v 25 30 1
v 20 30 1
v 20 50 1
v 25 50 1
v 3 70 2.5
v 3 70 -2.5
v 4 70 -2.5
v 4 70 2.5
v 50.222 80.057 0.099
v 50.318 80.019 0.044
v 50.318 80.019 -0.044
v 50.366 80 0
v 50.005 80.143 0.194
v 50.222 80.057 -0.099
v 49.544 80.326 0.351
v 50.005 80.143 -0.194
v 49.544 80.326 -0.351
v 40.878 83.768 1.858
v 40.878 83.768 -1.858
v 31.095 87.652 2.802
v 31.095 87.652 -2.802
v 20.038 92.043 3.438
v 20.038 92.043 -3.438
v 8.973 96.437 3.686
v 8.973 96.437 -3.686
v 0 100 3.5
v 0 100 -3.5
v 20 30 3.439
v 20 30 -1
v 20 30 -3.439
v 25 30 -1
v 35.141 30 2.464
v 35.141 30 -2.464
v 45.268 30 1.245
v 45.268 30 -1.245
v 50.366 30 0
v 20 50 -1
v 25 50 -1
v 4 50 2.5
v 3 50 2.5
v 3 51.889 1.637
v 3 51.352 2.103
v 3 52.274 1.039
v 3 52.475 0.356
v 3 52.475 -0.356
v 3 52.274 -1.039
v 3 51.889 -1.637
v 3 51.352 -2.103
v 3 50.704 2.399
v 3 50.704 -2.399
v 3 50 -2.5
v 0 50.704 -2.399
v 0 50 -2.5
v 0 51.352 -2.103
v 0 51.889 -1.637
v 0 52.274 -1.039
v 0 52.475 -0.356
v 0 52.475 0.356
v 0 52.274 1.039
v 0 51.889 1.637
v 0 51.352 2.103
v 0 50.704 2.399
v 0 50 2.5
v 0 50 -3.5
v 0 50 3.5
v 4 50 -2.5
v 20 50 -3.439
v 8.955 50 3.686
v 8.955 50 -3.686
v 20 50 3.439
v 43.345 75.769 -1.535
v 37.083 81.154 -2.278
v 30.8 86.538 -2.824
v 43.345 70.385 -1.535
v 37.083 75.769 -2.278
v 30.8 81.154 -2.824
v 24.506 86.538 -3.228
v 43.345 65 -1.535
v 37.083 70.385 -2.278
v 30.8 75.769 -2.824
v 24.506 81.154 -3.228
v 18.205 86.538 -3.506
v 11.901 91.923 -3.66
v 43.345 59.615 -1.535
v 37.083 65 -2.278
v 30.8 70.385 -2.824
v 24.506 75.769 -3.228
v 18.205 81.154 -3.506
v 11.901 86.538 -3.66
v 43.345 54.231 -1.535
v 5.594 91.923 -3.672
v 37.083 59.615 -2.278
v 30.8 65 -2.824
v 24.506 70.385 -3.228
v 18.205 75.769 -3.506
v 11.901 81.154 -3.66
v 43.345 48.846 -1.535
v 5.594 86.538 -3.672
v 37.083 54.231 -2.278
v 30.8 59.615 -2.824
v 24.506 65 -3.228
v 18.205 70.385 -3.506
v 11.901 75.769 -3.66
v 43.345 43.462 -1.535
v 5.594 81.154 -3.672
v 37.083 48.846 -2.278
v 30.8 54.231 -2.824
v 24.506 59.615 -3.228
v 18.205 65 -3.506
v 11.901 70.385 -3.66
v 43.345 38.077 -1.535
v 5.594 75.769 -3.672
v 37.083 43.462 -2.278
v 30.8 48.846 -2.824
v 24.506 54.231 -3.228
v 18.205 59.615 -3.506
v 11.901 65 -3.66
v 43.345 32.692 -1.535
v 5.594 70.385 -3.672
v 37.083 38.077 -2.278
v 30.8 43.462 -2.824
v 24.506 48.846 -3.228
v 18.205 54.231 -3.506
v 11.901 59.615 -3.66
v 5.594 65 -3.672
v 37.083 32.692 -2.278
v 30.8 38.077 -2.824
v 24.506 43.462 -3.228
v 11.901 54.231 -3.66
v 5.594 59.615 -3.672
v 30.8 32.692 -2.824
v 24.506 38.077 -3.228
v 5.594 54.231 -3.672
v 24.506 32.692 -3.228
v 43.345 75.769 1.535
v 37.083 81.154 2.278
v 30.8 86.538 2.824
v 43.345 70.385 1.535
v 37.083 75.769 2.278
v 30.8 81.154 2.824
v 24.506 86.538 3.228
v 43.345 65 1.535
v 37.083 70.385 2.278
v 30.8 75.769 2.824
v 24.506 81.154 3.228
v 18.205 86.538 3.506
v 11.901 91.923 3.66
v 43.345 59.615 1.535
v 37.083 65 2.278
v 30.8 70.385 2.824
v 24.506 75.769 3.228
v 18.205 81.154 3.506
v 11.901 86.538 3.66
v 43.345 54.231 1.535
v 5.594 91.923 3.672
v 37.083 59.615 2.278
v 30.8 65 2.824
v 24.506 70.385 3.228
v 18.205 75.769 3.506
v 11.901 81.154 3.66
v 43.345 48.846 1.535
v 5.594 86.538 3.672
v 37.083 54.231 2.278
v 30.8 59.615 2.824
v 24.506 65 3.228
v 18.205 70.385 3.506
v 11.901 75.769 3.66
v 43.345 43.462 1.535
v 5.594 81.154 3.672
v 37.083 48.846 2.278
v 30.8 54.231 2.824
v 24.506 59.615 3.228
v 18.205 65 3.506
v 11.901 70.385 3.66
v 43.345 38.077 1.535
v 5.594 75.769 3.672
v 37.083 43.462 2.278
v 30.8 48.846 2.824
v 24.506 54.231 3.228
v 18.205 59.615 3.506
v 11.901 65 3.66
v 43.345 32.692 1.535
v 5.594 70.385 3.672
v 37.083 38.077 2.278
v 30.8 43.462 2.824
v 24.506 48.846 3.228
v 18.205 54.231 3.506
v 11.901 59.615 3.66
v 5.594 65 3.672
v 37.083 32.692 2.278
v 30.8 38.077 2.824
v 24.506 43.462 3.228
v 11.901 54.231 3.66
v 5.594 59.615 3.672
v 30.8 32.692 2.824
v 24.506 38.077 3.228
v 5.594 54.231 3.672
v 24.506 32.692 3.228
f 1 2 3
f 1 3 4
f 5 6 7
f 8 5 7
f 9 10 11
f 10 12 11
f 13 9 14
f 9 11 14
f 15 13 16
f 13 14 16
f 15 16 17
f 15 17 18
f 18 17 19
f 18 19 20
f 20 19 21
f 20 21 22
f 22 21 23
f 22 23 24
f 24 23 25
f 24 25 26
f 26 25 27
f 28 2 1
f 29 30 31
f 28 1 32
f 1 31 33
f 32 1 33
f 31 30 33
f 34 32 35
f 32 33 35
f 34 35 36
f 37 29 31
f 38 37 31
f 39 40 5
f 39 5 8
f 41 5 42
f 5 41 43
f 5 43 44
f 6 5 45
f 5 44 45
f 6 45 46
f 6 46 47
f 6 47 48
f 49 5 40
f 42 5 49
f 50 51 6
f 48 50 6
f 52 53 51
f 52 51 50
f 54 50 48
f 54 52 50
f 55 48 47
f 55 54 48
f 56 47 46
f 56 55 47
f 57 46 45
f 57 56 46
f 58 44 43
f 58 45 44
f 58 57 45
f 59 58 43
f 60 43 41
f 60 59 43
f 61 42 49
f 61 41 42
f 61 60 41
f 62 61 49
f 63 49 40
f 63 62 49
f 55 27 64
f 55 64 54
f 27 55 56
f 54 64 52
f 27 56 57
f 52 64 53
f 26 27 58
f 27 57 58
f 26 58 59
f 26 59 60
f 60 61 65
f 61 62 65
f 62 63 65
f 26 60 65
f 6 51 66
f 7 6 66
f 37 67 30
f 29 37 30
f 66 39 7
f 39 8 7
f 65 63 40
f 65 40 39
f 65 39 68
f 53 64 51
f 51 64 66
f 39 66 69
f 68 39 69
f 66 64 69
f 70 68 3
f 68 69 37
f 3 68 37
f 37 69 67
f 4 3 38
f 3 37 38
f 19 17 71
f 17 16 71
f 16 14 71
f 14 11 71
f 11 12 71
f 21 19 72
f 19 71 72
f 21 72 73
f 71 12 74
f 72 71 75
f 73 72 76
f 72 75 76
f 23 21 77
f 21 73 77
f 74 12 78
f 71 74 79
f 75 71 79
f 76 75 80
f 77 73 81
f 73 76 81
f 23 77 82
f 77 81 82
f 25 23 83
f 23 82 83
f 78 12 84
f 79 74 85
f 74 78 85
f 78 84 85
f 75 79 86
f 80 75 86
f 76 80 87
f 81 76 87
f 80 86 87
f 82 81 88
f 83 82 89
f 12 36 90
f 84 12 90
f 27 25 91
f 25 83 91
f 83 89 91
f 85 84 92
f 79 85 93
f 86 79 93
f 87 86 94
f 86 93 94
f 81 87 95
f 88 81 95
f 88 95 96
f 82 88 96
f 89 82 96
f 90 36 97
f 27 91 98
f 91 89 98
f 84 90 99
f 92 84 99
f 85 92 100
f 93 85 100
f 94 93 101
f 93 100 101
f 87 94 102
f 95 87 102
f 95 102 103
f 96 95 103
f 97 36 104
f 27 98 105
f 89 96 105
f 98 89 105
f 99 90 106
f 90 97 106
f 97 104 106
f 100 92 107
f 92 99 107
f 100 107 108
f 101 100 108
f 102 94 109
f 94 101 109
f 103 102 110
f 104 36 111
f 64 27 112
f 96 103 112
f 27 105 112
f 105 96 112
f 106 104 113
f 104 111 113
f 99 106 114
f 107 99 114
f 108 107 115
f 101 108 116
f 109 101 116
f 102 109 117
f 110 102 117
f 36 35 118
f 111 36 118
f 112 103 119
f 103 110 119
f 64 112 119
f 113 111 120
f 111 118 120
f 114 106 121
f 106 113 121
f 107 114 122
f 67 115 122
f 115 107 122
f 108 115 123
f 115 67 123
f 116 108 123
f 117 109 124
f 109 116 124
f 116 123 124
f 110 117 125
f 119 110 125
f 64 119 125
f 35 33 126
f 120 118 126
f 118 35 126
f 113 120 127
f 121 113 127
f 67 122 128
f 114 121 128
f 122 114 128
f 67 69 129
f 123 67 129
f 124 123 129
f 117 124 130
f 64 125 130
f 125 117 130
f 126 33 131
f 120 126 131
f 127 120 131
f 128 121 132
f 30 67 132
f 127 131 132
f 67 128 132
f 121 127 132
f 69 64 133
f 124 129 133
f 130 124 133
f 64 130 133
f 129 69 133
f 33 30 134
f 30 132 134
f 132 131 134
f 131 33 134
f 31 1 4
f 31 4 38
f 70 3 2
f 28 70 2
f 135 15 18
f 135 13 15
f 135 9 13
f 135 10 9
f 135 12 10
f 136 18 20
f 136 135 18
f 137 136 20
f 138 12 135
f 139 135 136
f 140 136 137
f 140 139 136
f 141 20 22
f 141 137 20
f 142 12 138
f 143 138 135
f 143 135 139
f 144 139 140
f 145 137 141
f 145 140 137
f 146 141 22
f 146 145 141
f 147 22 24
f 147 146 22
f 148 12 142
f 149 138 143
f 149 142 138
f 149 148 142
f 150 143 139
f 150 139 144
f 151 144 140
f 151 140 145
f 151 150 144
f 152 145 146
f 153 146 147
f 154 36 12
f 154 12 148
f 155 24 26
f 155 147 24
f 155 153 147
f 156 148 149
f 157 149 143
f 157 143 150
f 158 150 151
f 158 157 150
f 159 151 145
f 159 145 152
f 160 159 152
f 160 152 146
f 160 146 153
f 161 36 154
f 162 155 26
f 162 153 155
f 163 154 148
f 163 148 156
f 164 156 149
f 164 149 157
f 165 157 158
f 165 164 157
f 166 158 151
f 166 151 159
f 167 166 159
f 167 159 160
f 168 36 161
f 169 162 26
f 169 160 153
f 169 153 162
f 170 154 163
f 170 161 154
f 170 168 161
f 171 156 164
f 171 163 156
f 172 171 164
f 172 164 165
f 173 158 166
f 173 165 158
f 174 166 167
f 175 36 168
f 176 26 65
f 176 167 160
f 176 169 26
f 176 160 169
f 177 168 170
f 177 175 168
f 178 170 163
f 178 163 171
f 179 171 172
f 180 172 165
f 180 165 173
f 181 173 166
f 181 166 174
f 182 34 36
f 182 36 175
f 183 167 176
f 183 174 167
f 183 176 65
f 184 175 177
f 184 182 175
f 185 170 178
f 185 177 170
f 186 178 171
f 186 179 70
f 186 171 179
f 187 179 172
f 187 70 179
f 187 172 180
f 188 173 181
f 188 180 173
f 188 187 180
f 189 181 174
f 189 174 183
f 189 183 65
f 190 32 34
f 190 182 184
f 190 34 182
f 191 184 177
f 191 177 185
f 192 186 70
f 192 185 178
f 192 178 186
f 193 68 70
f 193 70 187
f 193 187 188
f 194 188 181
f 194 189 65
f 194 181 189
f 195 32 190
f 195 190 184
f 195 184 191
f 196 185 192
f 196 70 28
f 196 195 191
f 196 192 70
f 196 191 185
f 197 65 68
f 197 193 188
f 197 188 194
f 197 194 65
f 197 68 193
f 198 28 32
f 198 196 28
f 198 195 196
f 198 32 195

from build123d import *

# Parameters (mm, degrees)
EXTRUDE_2_DEPTH          = 100
CUT_EXTRUDE_1_DEPTH      = 100
CUT_EXTRUDE_1_DEPTH_BACK = 100
CUT_EXTRUDE_2_DEPTH      = 100
CUT_EXTRUDE_2_DEPTH_BACK = 100
SKETCH_7_R               = 2.5
CUT_EXTRUDE_3_DEPTH      = 4
SKETCH_9_W               = 5
SKETCH_9_H               = 2
CUT_EXTRUDE_5_DEPTH      = 50
SKETCH_11_W              = 1
SKETCH_11_H              = 5
CUT_EXTRUDE_6_DEPTH      = 70


with BuildPart() as part:
    # 草图1 → 凸台-拉伸2 (new body)
    with BuildSketch(Plane(origin=(0, 0, 0), x_dir=(1, 0, 0), z_dir=(0, 1, 0))):
        with BuildLine():
            Line((0, 3.5), (0, -3.5))
            add(Edge.make_bspline(
                [(50.366159274, 0), (50.361611856, -0.007626809), (50.351204479, -0.02006437), (50.331882619, -0.034590016), (50.303550644, -0.054206105), (50.267550201, -0.075556608), (50.212502865, -0.10497516), (50.119653298, -0.148566943), (49.957819519, -0.214752734), (49.665215675, -0.317523283), (49.13925125, -0.473472151), (48.270224034, -0.688745908), (46.70823084, -1.011640024), (44.506574683, -1.380432353), (41.778946661, -1.759931683), (38.652126132, -2.124759538), (35.514265565, -2.438710467), (32.372435692, -2.710036408), (29.227679081, -2.944564854), (26.08060135, -3.145565261), (22.931686571, -3.315201685), (19.781279338, -3.454355095), (16.629676417, -3.563265326), (13.477153227, -3.64092263), (10.32396772, -3.685707952), (7.170479651, -3.693560136), (4.194558842, -3.660897819), (2.007697821, -3.59990808), (0.60968903, -3.538531774), (0, -3.5)],
                knots=[0, 0, 0, 0, 0, 0.00069899, 0.001287975, 0.00188024, 0.002733393, 0.003996075, 0.006218737, 0.009974212, 0.016536224, 0.028474968, 0.049524397, 0.080651233, 0.142462147, 0.204715828, 0.26696952, 0.329223211, 0.391476901, 0.453730594, 0.515984286, 0.578237977, 0.640491669, 0.70274536, 0.764999052, 0.827252742, 0.889506435, 0.951760127, 1, 1, 1, 1, 1], degree=4))
            add(Edge.make_bspline(
                [(50.366159274, 0), (50.361611856, 0.007626809), (50.351204479, 0.02006437), (50.331882619, 0.034590016), (50.303550644, 0.054206105), (50.267550201, 0.075556608), (50.212502865, 0.10497516), (50.119653298, 0.148566943), (49.957819519, 0.214752734), (49.665215675, 0.317523283), (49.13925125, 0.473472151), (48.270224034, 0.688745908), (46.70823084, 1.011640024), (44.506574683, 1.380432353), (41.778946661, 1.759931683), (38.652126132, 2.124759538), (35.514265565, 2.438710467), (32.372435692, 2.710036408), (29.227679081, 2.944564854), (26.08060135, 3.145565261), (22.931686571, 3.315201685), (19.781279338, 3.454355095), (16.629676417, 3.563265326), (13.477153227, 3.64092263), (10.32396772, 3.685707952), (7.170479651, 3.693560136), (4.194558842, 3.660897819), (2.007697821, 3.59990808), (0.60968903, 3.538531774), (0, 3.5)],
                knots=[0, 0, 0, 0, 0, 0.00069899, 0.001287975, 0.00188024, 0.002733393, 0.003996075, 0.006218737, 0.009974212, 0.016536224, 0.028474968, 0.049524397, 0.080651233, 0.142462147, 0.204715828, 0.26696952, 0.329223211, 0.391476901, 0.453730594, 0.515984286, 0.578237977, 0.640491669, 0.70274536, 0.764999052, 0.827252742, 0.889506435, 0.951760127, 1, 1, 1, 1, 1], degree=4))
        make_face()
    extrude(amount=EXTRUDE_2_DEPTH)

    # 草图3 → 切除-拉伸1 (cut, two sides: drawn at the far end of the back side and taken through both)
    with BuildSketch(Plane.XY.offset(-CUT_EXTRUDE_1_DEPTH_BACK)):
        Polygon((50.366159274, 100), (50.366159274, 80), (0, 100), align=None)
        Polygon((50.366159274, 0), (50.366159274, 20), (0, 0), align=None)
    extrude(amount=CUT_EXTRUDE_1_DEPTH + CUT_EXTRUDE_1_DEPTH_BACK, mode=Mode.SUBTRACT)

    # 草图6 → 切除-拉伸2 (cut, two sides: drawn at the far end of the back side and taken through both)
    with BuildSketch(Plane.XY.offset(-CUT_EXTRUDE_2_DEPTH_BACK)):
        Polygon((0, 50), (20, 50), (20, 30), (50.366159274, 30), (50.366159274, 20), (0, 0), align=None)
    extrude(amount=CUT_EXTRUDE_2_DEPTH + CUT_EXTRUDE_2_DEPTH_BACK, mode=Mode.SUBTRACT)

    # 草图7 → 切除-拉伸3 (cut)
    with BuildSketch(Plane(origin=(0, 0, 0), x_dir=(0, 0, -1), z_dir=(1, 0, 0))):
        with Locations((0, 50)):
            Circle(SKETCH_7_R)
    extrude(amount=CUT_EXTRUDE_3_DEPTH, mode=Mode.SUBTRACT)

    # 草图9 → 切除-拉伸5 (cut)
    with BuildSketch(Plane(origin=(0, 0, 0), x_dir=(1, 0, 0), z_dir=(0, 1, 0))):
        with Locations((22.5, 0)):
            Rectangle(SKETCH_9_W, SKETCH_9_H)
    extrude(amount=CUT_EXTRUDE_5_DEPTH, mode=Mode.SUBTRACT)

    # 草图11 → 切除-拉伸6 (cut)
    with BuildSketch(Plane(origin=(0, 0, 0), x_dir=(1, 0, 0), z_dir=(0, 1, 0))):
        with Locations((3.5, 0)):
            Rectangle(SKETCH_11_W, SKETCH_11_H)
    extrude(amount=CUT_EXTRUDE_6_DEPTH, mode=Mode.SUBTRACT)


solid = part.part
